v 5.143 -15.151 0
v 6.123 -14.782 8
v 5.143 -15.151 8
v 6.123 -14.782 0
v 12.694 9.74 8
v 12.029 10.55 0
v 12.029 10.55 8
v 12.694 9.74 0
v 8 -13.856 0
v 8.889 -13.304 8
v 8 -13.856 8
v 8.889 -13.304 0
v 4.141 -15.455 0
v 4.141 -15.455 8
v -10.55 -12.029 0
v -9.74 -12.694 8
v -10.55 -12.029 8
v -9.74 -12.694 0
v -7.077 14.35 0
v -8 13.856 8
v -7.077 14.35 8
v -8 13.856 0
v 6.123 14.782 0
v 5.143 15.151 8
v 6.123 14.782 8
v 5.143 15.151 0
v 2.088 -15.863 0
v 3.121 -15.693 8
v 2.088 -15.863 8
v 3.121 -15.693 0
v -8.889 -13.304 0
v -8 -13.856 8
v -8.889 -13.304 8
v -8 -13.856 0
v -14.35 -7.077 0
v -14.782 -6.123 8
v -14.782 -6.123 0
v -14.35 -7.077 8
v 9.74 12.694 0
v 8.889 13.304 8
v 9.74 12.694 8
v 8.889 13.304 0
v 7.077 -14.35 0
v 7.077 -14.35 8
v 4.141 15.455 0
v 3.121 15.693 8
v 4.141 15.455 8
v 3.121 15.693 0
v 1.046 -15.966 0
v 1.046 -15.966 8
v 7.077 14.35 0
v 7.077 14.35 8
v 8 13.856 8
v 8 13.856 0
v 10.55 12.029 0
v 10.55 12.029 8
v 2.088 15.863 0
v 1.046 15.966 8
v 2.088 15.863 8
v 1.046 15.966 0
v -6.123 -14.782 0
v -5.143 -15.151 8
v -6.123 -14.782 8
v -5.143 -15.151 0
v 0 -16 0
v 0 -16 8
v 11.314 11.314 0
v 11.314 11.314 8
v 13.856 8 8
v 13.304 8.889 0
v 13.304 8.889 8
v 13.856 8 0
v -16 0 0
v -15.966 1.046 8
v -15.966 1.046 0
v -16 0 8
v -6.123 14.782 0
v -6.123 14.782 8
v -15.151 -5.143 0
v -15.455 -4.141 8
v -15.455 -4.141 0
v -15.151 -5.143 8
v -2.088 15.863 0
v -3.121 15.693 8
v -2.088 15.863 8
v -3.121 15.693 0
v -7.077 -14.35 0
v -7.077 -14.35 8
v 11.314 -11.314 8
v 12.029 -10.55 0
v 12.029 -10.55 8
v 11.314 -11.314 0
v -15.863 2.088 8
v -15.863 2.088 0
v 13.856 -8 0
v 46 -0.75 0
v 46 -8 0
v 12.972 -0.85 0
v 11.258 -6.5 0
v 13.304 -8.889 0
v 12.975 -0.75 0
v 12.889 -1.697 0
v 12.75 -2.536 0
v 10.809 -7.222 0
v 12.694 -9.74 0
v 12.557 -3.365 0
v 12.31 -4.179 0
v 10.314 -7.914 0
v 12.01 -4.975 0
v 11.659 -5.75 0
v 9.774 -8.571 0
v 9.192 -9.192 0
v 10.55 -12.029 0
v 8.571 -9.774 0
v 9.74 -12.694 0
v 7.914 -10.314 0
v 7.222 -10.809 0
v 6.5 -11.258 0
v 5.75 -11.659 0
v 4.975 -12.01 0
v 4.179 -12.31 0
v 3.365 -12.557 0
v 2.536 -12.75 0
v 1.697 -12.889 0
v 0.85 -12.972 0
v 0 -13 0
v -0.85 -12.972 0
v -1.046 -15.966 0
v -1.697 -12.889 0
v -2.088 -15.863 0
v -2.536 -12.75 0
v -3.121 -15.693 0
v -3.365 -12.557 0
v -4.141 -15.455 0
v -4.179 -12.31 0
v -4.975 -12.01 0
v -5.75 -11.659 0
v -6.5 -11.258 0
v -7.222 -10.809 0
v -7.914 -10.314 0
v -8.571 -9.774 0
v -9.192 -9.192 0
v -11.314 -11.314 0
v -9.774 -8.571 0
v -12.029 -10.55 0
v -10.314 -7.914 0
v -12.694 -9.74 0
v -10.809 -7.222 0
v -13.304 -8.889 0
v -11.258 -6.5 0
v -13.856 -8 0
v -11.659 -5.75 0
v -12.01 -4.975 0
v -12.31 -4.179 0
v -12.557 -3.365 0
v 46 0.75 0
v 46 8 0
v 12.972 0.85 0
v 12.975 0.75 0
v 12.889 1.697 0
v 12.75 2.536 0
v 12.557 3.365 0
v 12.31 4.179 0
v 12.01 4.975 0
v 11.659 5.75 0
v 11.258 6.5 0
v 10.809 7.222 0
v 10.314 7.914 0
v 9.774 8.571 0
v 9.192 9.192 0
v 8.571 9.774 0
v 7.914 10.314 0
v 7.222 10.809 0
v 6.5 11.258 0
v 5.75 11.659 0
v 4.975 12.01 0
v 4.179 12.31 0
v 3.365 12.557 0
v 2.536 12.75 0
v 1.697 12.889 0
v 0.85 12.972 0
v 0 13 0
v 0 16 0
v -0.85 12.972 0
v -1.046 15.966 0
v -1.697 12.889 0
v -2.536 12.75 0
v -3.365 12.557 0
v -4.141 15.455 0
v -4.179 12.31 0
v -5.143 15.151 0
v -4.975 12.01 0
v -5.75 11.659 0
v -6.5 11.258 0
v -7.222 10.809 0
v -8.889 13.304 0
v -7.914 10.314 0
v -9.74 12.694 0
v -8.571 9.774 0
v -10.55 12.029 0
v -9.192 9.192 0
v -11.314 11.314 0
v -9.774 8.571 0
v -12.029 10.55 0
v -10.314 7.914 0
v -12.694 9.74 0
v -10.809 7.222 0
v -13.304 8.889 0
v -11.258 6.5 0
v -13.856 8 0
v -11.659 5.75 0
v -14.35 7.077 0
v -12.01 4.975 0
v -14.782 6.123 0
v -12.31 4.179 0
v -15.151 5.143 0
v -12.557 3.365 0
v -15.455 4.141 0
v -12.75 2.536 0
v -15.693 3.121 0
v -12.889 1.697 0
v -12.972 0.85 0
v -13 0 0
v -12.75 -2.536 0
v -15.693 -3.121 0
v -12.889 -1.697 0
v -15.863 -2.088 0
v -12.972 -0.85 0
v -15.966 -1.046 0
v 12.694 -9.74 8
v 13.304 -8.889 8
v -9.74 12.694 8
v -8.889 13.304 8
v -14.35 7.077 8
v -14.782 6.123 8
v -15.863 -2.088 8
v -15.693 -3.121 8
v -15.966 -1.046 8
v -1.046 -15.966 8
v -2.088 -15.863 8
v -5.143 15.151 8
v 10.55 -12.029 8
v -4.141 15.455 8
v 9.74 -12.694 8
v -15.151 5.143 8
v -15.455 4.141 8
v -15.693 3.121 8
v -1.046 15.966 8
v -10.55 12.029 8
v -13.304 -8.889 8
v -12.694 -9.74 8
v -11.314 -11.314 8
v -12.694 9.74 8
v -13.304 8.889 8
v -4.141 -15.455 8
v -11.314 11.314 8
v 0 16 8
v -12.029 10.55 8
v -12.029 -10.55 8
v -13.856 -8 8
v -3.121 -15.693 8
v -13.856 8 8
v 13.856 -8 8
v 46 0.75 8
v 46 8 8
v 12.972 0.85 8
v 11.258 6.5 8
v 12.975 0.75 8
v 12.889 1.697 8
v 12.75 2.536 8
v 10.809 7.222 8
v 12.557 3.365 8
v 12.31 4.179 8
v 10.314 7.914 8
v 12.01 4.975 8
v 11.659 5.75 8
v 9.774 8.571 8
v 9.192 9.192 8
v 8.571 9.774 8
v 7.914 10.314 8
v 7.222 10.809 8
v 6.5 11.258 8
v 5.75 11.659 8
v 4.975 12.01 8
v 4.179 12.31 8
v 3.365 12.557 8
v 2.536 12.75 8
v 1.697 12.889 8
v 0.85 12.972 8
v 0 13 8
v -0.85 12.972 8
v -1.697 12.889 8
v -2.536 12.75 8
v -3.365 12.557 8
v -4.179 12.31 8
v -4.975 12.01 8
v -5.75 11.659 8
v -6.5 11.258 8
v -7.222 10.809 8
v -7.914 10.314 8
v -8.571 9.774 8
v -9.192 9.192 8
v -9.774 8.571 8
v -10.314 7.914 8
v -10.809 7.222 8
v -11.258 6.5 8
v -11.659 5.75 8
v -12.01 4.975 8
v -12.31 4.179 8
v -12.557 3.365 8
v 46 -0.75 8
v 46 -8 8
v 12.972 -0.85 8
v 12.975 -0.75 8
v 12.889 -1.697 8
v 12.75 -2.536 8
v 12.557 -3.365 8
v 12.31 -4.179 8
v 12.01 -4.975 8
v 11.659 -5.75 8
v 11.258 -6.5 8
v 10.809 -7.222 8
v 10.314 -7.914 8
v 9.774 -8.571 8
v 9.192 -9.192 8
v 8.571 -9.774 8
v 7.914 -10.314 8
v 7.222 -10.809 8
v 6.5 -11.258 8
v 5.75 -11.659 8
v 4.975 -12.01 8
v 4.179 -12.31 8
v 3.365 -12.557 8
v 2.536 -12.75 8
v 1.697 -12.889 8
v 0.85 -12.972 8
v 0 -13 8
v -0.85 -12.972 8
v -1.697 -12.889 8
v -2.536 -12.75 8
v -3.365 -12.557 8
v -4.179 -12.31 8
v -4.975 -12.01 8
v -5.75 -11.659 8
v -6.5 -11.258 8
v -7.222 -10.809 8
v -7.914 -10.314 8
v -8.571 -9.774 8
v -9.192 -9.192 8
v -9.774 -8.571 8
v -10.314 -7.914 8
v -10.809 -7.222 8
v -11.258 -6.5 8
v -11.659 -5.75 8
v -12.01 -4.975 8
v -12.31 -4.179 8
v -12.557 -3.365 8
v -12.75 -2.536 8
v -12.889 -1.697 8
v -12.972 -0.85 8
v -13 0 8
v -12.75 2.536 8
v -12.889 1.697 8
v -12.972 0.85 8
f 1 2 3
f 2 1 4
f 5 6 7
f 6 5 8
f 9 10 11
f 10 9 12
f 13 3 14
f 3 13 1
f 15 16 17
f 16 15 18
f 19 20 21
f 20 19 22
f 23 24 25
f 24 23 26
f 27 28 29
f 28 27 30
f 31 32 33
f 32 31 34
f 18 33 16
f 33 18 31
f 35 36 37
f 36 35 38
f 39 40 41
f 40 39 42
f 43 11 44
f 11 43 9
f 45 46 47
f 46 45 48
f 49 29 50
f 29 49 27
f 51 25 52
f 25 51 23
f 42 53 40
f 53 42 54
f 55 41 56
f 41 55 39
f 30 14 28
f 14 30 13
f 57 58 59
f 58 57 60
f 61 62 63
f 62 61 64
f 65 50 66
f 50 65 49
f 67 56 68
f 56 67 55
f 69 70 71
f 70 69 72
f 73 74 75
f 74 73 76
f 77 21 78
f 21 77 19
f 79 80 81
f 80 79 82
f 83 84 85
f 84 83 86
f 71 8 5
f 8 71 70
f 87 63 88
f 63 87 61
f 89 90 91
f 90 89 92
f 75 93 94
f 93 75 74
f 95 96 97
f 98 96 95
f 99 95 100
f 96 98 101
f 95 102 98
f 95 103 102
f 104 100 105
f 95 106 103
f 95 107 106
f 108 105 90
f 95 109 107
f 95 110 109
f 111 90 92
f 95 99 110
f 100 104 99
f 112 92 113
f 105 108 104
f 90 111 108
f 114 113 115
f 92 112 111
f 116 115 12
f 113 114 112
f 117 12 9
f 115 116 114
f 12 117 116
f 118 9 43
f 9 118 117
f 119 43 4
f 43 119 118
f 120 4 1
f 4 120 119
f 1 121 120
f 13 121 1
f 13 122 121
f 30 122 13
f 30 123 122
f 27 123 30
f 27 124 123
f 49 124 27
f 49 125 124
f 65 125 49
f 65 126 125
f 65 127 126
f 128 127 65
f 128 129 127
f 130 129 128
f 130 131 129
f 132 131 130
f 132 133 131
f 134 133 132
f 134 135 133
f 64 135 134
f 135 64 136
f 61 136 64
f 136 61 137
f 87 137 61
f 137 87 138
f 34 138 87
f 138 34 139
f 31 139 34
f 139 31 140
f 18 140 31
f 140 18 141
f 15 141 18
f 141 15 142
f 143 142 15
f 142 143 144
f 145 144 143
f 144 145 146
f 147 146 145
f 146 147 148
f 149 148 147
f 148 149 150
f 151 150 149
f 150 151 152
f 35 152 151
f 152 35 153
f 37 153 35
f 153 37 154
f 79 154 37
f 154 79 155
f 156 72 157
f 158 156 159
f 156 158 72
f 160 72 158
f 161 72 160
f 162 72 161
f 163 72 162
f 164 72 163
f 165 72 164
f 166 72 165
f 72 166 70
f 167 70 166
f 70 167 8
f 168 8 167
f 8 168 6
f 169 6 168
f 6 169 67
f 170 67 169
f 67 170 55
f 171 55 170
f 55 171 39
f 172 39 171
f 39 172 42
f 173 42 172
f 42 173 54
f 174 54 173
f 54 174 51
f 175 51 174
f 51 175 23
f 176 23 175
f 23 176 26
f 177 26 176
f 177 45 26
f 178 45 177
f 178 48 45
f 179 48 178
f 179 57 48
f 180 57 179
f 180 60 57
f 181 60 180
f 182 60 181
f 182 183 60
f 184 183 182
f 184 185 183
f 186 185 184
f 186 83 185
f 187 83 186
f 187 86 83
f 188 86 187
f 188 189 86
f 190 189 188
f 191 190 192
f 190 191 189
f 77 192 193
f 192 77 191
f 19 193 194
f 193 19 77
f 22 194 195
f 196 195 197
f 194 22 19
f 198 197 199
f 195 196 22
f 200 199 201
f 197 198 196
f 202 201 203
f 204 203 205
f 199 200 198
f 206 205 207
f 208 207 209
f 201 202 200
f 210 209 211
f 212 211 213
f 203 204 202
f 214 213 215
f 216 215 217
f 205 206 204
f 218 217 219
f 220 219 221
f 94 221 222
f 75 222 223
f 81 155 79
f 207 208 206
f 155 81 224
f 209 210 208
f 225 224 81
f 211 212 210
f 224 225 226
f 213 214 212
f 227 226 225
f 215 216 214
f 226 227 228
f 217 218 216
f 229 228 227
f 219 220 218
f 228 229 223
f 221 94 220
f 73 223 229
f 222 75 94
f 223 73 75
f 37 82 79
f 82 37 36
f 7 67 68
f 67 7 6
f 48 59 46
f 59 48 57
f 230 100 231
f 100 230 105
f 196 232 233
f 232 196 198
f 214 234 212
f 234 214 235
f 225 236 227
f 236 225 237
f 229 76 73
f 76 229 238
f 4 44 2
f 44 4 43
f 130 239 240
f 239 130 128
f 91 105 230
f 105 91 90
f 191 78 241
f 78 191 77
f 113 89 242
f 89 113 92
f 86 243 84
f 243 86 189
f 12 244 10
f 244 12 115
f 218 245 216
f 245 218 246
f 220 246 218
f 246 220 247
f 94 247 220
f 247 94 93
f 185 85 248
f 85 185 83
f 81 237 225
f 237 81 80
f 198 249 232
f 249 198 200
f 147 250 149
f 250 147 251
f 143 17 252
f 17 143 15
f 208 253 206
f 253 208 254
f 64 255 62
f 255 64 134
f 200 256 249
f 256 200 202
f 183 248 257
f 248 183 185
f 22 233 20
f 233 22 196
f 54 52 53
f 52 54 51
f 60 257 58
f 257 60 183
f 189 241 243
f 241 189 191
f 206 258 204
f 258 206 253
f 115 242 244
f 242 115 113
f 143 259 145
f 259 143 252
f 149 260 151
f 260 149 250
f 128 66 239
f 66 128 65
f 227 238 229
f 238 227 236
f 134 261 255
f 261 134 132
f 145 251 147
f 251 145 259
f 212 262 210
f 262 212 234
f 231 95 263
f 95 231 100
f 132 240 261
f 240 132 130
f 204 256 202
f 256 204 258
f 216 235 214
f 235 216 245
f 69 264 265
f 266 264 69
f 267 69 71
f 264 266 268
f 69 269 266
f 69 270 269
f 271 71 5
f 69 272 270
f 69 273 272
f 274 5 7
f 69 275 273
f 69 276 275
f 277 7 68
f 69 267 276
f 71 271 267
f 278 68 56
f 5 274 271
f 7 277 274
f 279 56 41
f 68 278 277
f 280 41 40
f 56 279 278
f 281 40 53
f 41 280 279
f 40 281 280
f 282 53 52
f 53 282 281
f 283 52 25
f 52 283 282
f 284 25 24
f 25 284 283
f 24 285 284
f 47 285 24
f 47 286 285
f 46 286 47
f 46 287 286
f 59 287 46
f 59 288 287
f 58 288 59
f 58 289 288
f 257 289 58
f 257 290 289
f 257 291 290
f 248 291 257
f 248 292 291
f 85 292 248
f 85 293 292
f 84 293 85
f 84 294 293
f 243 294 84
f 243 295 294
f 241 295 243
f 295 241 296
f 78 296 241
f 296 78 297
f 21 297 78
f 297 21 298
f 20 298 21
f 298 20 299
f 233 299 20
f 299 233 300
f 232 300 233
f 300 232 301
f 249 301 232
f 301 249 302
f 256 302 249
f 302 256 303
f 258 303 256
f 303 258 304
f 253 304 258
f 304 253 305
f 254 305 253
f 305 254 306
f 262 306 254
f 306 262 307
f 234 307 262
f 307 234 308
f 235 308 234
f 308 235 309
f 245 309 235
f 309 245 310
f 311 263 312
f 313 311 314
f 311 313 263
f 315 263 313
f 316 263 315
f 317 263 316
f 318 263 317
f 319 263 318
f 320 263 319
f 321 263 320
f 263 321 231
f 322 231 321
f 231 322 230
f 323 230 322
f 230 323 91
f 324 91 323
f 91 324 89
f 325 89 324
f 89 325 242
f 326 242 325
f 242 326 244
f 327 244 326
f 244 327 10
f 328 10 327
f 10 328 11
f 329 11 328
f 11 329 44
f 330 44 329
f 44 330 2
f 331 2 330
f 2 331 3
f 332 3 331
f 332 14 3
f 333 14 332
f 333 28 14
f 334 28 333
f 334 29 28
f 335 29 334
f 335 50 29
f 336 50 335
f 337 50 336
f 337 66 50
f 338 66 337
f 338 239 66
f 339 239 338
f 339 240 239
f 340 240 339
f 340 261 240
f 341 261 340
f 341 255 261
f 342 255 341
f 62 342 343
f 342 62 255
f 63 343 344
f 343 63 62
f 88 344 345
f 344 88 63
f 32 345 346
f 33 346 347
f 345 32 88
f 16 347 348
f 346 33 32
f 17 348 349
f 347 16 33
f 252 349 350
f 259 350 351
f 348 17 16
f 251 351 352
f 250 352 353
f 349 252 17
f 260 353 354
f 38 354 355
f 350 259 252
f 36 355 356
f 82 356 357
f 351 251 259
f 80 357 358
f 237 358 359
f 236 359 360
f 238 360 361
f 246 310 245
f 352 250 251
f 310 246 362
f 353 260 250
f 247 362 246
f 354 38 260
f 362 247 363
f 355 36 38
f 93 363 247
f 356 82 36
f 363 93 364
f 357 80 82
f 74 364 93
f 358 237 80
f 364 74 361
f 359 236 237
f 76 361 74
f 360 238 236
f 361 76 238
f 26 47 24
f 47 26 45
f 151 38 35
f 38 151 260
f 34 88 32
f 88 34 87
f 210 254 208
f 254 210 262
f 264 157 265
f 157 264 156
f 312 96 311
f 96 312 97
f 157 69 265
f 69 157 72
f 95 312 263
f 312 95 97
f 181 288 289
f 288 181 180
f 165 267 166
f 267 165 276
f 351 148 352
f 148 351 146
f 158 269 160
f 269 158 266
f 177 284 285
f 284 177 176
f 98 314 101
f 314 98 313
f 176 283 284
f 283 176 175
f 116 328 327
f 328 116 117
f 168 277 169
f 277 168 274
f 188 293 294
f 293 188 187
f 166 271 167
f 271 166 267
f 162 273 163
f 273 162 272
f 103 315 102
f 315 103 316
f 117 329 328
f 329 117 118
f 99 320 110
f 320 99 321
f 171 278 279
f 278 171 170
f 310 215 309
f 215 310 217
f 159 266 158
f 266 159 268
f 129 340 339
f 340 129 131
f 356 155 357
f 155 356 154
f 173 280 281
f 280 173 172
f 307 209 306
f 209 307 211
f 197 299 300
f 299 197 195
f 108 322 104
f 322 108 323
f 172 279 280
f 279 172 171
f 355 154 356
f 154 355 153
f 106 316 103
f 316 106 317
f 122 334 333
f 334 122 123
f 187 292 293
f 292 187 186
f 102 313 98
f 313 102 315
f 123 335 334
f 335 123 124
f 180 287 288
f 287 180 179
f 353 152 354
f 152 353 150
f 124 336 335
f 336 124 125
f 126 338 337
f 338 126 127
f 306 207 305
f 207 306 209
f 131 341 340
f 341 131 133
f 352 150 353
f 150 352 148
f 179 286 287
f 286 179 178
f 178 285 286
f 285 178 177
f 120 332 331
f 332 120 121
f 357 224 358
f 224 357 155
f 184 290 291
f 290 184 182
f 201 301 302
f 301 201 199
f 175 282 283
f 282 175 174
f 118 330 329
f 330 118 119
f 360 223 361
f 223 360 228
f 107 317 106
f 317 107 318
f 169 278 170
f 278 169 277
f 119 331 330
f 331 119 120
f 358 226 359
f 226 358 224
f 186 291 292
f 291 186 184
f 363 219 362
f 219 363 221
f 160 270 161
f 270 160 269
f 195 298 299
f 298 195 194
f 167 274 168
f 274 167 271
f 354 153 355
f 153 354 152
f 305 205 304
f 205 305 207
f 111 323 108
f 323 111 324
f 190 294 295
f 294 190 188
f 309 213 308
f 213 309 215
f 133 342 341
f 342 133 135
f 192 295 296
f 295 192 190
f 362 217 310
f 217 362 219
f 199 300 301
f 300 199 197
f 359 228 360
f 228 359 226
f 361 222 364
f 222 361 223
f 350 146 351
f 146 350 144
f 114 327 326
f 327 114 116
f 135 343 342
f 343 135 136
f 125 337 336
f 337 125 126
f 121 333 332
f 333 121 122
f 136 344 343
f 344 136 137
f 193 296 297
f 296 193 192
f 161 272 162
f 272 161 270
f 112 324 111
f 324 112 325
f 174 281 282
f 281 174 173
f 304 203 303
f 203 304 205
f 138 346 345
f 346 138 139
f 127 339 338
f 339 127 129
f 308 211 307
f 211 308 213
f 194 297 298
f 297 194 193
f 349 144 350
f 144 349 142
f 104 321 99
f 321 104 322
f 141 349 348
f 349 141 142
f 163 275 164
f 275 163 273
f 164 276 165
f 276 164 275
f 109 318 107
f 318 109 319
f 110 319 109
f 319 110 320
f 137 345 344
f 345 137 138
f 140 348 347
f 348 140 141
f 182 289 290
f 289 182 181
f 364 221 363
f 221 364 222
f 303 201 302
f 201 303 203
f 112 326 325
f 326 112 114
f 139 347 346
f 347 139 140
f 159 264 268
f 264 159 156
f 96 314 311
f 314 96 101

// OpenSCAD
// GV30 lux add-on: a split ring between the clamp's stub shoulder and the GV30.
// It slips over the stub; the split lets it go on around the coax without pulling it.
// A short arm runs straight out, the split continuing down its middle.
// Origin: antenna axis on Z, z = 0 on the stub's shoulder. Prints as shown.

/* [Ring] */
od = 32;            // the shoulder it sits on, off ref/clamp-upper.stl
id = 26;            // over the 1"-14 stub (OD 25.2)
h = 8;              // costs this much thread engagement (GV30 thread depth not measured)
split = 1.5;        // gap
arm_w = 16;         // across, split included
arm_l = 30;         // beyond the ring

$fn = 96;
e = 0.01;

difference() {
  union() {
    cylinder(d = od, h = h);
    translate([0, -arm_w / 2, 0]) cube([od / 2 + arm_l, arm_w, h]);
  }
  translate([0, 0, -e]) cylinder(d = id, h = h + 2 * e);
  translate([0, -split / 2, -e]) cube([od / 2 + arm_l + 1, split, h + 2 * e]);
}
